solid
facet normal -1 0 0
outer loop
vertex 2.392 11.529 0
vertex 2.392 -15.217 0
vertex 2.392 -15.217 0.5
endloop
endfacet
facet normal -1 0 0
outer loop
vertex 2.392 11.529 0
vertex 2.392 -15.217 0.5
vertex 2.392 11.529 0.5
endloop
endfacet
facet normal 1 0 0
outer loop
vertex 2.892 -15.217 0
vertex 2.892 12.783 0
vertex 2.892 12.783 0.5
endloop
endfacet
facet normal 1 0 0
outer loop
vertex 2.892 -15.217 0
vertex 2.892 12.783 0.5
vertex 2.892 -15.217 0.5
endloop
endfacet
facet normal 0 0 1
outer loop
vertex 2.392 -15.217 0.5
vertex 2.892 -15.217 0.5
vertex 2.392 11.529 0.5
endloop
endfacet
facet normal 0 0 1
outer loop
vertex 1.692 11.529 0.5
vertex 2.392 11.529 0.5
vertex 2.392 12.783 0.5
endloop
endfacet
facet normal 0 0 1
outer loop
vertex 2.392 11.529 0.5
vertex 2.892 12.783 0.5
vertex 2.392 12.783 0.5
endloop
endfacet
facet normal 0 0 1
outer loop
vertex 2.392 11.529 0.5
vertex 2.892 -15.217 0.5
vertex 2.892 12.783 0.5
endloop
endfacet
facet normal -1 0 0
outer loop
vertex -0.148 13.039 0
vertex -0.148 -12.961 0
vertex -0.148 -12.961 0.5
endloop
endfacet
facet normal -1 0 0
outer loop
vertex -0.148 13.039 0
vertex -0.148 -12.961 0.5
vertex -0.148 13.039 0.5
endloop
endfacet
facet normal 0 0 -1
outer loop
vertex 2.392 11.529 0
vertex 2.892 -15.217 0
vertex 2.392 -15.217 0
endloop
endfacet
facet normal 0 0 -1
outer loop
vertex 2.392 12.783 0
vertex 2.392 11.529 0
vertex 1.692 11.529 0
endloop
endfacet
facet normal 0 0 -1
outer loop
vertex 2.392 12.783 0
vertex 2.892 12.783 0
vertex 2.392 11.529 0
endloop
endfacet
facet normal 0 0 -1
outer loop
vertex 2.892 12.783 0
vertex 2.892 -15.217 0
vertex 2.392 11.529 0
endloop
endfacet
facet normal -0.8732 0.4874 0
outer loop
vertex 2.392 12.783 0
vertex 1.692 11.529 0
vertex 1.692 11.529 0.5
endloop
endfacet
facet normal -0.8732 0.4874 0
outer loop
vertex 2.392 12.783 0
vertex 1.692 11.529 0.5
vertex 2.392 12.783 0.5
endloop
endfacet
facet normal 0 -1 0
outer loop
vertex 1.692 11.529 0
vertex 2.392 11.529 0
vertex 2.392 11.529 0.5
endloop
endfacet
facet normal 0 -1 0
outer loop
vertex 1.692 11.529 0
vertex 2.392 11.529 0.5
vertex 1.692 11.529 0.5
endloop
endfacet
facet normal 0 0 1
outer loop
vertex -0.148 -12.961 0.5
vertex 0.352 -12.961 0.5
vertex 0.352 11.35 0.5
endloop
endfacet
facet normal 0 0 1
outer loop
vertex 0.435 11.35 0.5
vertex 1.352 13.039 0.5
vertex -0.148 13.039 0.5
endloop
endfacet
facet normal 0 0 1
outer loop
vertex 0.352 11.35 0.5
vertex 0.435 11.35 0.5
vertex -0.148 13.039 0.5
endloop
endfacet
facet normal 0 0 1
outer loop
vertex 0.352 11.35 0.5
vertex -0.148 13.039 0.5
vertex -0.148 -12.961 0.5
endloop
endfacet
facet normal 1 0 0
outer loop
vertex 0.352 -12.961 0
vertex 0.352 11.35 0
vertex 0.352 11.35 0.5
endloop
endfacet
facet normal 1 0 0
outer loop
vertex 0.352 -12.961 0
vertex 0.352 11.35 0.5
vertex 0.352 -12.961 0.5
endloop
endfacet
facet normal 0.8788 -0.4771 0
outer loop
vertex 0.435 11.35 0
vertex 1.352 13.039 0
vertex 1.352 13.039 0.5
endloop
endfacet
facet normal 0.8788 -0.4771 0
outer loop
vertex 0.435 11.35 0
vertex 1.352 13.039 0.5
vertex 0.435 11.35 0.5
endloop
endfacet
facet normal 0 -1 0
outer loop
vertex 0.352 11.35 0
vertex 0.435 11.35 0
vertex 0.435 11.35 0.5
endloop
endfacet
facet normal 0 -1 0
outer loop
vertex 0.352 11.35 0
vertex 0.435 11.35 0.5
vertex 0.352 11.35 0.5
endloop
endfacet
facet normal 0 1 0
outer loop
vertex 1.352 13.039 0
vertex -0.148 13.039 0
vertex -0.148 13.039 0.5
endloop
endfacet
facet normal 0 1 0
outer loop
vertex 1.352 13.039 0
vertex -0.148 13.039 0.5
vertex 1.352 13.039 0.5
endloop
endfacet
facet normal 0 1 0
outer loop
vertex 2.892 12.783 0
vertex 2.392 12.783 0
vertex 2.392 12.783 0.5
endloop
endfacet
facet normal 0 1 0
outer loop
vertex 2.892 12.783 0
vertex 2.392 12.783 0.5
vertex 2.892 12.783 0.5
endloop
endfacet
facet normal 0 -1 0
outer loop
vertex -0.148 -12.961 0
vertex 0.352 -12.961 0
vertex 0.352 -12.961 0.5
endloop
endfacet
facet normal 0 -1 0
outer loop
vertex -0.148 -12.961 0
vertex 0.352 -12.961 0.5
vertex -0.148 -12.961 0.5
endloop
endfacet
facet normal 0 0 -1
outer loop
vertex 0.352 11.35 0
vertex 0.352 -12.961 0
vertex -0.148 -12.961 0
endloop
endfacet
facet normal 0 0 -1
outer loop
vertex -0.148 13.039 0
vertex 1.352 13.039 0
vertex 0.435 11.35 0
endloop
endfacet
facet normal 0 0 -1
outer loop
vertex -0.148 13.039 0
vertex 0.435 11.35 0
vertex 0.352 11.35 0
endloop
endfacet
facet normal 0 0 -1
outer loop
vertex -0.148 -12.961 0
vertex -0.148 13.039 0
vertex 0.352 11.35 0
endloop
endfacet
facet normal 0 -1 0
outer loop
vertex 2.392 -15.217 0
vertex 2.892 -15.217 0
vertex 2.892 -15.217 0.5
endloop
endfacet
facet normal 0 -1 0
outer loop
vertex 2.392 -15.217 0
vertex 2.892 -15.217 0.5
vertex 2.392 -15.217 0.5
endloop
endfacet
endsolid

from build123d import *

# Parameters (mm, degrees)
BOSS_EXTRUDE1_DEPTH   = 0.5
BOSS_EXTRUDE1_2_DEPTH = 0.5


with BuildPart() as part:
    # Sketch1 → Boss-Extrude1 (new body)
    with BuildSketch(Plane.XY):
        Polygon((2.391735862, 12.78255814), (2.891735862, 12.78255814), (2.891735862, -15.21744186), (2.391735862, -15.21744186), (2.391735862, 11.528764229), (1.691735862, 11.528764229), align=None)
    extrude(amount=BOSS_EXTRUDE1_DEPTH)


with BuildPart() as body_2:
    # Sketch1 → Boss-Extrude1 2 (new body)
    with BuildSketch(Plane.XY):
        Polygon((-0.148264138, 13.038708658), (1.351735862, 13.038708658), (0.435111642, 11.35), (0.351735862, 11.35), (0.351735862, -12.961291342), (-0.148264138, -12.961291342), align=None)
    extrude(amount=BOSS_EXTRUDE1_2_DEPTH)


solid = Compound([part.part, body_2.part])
